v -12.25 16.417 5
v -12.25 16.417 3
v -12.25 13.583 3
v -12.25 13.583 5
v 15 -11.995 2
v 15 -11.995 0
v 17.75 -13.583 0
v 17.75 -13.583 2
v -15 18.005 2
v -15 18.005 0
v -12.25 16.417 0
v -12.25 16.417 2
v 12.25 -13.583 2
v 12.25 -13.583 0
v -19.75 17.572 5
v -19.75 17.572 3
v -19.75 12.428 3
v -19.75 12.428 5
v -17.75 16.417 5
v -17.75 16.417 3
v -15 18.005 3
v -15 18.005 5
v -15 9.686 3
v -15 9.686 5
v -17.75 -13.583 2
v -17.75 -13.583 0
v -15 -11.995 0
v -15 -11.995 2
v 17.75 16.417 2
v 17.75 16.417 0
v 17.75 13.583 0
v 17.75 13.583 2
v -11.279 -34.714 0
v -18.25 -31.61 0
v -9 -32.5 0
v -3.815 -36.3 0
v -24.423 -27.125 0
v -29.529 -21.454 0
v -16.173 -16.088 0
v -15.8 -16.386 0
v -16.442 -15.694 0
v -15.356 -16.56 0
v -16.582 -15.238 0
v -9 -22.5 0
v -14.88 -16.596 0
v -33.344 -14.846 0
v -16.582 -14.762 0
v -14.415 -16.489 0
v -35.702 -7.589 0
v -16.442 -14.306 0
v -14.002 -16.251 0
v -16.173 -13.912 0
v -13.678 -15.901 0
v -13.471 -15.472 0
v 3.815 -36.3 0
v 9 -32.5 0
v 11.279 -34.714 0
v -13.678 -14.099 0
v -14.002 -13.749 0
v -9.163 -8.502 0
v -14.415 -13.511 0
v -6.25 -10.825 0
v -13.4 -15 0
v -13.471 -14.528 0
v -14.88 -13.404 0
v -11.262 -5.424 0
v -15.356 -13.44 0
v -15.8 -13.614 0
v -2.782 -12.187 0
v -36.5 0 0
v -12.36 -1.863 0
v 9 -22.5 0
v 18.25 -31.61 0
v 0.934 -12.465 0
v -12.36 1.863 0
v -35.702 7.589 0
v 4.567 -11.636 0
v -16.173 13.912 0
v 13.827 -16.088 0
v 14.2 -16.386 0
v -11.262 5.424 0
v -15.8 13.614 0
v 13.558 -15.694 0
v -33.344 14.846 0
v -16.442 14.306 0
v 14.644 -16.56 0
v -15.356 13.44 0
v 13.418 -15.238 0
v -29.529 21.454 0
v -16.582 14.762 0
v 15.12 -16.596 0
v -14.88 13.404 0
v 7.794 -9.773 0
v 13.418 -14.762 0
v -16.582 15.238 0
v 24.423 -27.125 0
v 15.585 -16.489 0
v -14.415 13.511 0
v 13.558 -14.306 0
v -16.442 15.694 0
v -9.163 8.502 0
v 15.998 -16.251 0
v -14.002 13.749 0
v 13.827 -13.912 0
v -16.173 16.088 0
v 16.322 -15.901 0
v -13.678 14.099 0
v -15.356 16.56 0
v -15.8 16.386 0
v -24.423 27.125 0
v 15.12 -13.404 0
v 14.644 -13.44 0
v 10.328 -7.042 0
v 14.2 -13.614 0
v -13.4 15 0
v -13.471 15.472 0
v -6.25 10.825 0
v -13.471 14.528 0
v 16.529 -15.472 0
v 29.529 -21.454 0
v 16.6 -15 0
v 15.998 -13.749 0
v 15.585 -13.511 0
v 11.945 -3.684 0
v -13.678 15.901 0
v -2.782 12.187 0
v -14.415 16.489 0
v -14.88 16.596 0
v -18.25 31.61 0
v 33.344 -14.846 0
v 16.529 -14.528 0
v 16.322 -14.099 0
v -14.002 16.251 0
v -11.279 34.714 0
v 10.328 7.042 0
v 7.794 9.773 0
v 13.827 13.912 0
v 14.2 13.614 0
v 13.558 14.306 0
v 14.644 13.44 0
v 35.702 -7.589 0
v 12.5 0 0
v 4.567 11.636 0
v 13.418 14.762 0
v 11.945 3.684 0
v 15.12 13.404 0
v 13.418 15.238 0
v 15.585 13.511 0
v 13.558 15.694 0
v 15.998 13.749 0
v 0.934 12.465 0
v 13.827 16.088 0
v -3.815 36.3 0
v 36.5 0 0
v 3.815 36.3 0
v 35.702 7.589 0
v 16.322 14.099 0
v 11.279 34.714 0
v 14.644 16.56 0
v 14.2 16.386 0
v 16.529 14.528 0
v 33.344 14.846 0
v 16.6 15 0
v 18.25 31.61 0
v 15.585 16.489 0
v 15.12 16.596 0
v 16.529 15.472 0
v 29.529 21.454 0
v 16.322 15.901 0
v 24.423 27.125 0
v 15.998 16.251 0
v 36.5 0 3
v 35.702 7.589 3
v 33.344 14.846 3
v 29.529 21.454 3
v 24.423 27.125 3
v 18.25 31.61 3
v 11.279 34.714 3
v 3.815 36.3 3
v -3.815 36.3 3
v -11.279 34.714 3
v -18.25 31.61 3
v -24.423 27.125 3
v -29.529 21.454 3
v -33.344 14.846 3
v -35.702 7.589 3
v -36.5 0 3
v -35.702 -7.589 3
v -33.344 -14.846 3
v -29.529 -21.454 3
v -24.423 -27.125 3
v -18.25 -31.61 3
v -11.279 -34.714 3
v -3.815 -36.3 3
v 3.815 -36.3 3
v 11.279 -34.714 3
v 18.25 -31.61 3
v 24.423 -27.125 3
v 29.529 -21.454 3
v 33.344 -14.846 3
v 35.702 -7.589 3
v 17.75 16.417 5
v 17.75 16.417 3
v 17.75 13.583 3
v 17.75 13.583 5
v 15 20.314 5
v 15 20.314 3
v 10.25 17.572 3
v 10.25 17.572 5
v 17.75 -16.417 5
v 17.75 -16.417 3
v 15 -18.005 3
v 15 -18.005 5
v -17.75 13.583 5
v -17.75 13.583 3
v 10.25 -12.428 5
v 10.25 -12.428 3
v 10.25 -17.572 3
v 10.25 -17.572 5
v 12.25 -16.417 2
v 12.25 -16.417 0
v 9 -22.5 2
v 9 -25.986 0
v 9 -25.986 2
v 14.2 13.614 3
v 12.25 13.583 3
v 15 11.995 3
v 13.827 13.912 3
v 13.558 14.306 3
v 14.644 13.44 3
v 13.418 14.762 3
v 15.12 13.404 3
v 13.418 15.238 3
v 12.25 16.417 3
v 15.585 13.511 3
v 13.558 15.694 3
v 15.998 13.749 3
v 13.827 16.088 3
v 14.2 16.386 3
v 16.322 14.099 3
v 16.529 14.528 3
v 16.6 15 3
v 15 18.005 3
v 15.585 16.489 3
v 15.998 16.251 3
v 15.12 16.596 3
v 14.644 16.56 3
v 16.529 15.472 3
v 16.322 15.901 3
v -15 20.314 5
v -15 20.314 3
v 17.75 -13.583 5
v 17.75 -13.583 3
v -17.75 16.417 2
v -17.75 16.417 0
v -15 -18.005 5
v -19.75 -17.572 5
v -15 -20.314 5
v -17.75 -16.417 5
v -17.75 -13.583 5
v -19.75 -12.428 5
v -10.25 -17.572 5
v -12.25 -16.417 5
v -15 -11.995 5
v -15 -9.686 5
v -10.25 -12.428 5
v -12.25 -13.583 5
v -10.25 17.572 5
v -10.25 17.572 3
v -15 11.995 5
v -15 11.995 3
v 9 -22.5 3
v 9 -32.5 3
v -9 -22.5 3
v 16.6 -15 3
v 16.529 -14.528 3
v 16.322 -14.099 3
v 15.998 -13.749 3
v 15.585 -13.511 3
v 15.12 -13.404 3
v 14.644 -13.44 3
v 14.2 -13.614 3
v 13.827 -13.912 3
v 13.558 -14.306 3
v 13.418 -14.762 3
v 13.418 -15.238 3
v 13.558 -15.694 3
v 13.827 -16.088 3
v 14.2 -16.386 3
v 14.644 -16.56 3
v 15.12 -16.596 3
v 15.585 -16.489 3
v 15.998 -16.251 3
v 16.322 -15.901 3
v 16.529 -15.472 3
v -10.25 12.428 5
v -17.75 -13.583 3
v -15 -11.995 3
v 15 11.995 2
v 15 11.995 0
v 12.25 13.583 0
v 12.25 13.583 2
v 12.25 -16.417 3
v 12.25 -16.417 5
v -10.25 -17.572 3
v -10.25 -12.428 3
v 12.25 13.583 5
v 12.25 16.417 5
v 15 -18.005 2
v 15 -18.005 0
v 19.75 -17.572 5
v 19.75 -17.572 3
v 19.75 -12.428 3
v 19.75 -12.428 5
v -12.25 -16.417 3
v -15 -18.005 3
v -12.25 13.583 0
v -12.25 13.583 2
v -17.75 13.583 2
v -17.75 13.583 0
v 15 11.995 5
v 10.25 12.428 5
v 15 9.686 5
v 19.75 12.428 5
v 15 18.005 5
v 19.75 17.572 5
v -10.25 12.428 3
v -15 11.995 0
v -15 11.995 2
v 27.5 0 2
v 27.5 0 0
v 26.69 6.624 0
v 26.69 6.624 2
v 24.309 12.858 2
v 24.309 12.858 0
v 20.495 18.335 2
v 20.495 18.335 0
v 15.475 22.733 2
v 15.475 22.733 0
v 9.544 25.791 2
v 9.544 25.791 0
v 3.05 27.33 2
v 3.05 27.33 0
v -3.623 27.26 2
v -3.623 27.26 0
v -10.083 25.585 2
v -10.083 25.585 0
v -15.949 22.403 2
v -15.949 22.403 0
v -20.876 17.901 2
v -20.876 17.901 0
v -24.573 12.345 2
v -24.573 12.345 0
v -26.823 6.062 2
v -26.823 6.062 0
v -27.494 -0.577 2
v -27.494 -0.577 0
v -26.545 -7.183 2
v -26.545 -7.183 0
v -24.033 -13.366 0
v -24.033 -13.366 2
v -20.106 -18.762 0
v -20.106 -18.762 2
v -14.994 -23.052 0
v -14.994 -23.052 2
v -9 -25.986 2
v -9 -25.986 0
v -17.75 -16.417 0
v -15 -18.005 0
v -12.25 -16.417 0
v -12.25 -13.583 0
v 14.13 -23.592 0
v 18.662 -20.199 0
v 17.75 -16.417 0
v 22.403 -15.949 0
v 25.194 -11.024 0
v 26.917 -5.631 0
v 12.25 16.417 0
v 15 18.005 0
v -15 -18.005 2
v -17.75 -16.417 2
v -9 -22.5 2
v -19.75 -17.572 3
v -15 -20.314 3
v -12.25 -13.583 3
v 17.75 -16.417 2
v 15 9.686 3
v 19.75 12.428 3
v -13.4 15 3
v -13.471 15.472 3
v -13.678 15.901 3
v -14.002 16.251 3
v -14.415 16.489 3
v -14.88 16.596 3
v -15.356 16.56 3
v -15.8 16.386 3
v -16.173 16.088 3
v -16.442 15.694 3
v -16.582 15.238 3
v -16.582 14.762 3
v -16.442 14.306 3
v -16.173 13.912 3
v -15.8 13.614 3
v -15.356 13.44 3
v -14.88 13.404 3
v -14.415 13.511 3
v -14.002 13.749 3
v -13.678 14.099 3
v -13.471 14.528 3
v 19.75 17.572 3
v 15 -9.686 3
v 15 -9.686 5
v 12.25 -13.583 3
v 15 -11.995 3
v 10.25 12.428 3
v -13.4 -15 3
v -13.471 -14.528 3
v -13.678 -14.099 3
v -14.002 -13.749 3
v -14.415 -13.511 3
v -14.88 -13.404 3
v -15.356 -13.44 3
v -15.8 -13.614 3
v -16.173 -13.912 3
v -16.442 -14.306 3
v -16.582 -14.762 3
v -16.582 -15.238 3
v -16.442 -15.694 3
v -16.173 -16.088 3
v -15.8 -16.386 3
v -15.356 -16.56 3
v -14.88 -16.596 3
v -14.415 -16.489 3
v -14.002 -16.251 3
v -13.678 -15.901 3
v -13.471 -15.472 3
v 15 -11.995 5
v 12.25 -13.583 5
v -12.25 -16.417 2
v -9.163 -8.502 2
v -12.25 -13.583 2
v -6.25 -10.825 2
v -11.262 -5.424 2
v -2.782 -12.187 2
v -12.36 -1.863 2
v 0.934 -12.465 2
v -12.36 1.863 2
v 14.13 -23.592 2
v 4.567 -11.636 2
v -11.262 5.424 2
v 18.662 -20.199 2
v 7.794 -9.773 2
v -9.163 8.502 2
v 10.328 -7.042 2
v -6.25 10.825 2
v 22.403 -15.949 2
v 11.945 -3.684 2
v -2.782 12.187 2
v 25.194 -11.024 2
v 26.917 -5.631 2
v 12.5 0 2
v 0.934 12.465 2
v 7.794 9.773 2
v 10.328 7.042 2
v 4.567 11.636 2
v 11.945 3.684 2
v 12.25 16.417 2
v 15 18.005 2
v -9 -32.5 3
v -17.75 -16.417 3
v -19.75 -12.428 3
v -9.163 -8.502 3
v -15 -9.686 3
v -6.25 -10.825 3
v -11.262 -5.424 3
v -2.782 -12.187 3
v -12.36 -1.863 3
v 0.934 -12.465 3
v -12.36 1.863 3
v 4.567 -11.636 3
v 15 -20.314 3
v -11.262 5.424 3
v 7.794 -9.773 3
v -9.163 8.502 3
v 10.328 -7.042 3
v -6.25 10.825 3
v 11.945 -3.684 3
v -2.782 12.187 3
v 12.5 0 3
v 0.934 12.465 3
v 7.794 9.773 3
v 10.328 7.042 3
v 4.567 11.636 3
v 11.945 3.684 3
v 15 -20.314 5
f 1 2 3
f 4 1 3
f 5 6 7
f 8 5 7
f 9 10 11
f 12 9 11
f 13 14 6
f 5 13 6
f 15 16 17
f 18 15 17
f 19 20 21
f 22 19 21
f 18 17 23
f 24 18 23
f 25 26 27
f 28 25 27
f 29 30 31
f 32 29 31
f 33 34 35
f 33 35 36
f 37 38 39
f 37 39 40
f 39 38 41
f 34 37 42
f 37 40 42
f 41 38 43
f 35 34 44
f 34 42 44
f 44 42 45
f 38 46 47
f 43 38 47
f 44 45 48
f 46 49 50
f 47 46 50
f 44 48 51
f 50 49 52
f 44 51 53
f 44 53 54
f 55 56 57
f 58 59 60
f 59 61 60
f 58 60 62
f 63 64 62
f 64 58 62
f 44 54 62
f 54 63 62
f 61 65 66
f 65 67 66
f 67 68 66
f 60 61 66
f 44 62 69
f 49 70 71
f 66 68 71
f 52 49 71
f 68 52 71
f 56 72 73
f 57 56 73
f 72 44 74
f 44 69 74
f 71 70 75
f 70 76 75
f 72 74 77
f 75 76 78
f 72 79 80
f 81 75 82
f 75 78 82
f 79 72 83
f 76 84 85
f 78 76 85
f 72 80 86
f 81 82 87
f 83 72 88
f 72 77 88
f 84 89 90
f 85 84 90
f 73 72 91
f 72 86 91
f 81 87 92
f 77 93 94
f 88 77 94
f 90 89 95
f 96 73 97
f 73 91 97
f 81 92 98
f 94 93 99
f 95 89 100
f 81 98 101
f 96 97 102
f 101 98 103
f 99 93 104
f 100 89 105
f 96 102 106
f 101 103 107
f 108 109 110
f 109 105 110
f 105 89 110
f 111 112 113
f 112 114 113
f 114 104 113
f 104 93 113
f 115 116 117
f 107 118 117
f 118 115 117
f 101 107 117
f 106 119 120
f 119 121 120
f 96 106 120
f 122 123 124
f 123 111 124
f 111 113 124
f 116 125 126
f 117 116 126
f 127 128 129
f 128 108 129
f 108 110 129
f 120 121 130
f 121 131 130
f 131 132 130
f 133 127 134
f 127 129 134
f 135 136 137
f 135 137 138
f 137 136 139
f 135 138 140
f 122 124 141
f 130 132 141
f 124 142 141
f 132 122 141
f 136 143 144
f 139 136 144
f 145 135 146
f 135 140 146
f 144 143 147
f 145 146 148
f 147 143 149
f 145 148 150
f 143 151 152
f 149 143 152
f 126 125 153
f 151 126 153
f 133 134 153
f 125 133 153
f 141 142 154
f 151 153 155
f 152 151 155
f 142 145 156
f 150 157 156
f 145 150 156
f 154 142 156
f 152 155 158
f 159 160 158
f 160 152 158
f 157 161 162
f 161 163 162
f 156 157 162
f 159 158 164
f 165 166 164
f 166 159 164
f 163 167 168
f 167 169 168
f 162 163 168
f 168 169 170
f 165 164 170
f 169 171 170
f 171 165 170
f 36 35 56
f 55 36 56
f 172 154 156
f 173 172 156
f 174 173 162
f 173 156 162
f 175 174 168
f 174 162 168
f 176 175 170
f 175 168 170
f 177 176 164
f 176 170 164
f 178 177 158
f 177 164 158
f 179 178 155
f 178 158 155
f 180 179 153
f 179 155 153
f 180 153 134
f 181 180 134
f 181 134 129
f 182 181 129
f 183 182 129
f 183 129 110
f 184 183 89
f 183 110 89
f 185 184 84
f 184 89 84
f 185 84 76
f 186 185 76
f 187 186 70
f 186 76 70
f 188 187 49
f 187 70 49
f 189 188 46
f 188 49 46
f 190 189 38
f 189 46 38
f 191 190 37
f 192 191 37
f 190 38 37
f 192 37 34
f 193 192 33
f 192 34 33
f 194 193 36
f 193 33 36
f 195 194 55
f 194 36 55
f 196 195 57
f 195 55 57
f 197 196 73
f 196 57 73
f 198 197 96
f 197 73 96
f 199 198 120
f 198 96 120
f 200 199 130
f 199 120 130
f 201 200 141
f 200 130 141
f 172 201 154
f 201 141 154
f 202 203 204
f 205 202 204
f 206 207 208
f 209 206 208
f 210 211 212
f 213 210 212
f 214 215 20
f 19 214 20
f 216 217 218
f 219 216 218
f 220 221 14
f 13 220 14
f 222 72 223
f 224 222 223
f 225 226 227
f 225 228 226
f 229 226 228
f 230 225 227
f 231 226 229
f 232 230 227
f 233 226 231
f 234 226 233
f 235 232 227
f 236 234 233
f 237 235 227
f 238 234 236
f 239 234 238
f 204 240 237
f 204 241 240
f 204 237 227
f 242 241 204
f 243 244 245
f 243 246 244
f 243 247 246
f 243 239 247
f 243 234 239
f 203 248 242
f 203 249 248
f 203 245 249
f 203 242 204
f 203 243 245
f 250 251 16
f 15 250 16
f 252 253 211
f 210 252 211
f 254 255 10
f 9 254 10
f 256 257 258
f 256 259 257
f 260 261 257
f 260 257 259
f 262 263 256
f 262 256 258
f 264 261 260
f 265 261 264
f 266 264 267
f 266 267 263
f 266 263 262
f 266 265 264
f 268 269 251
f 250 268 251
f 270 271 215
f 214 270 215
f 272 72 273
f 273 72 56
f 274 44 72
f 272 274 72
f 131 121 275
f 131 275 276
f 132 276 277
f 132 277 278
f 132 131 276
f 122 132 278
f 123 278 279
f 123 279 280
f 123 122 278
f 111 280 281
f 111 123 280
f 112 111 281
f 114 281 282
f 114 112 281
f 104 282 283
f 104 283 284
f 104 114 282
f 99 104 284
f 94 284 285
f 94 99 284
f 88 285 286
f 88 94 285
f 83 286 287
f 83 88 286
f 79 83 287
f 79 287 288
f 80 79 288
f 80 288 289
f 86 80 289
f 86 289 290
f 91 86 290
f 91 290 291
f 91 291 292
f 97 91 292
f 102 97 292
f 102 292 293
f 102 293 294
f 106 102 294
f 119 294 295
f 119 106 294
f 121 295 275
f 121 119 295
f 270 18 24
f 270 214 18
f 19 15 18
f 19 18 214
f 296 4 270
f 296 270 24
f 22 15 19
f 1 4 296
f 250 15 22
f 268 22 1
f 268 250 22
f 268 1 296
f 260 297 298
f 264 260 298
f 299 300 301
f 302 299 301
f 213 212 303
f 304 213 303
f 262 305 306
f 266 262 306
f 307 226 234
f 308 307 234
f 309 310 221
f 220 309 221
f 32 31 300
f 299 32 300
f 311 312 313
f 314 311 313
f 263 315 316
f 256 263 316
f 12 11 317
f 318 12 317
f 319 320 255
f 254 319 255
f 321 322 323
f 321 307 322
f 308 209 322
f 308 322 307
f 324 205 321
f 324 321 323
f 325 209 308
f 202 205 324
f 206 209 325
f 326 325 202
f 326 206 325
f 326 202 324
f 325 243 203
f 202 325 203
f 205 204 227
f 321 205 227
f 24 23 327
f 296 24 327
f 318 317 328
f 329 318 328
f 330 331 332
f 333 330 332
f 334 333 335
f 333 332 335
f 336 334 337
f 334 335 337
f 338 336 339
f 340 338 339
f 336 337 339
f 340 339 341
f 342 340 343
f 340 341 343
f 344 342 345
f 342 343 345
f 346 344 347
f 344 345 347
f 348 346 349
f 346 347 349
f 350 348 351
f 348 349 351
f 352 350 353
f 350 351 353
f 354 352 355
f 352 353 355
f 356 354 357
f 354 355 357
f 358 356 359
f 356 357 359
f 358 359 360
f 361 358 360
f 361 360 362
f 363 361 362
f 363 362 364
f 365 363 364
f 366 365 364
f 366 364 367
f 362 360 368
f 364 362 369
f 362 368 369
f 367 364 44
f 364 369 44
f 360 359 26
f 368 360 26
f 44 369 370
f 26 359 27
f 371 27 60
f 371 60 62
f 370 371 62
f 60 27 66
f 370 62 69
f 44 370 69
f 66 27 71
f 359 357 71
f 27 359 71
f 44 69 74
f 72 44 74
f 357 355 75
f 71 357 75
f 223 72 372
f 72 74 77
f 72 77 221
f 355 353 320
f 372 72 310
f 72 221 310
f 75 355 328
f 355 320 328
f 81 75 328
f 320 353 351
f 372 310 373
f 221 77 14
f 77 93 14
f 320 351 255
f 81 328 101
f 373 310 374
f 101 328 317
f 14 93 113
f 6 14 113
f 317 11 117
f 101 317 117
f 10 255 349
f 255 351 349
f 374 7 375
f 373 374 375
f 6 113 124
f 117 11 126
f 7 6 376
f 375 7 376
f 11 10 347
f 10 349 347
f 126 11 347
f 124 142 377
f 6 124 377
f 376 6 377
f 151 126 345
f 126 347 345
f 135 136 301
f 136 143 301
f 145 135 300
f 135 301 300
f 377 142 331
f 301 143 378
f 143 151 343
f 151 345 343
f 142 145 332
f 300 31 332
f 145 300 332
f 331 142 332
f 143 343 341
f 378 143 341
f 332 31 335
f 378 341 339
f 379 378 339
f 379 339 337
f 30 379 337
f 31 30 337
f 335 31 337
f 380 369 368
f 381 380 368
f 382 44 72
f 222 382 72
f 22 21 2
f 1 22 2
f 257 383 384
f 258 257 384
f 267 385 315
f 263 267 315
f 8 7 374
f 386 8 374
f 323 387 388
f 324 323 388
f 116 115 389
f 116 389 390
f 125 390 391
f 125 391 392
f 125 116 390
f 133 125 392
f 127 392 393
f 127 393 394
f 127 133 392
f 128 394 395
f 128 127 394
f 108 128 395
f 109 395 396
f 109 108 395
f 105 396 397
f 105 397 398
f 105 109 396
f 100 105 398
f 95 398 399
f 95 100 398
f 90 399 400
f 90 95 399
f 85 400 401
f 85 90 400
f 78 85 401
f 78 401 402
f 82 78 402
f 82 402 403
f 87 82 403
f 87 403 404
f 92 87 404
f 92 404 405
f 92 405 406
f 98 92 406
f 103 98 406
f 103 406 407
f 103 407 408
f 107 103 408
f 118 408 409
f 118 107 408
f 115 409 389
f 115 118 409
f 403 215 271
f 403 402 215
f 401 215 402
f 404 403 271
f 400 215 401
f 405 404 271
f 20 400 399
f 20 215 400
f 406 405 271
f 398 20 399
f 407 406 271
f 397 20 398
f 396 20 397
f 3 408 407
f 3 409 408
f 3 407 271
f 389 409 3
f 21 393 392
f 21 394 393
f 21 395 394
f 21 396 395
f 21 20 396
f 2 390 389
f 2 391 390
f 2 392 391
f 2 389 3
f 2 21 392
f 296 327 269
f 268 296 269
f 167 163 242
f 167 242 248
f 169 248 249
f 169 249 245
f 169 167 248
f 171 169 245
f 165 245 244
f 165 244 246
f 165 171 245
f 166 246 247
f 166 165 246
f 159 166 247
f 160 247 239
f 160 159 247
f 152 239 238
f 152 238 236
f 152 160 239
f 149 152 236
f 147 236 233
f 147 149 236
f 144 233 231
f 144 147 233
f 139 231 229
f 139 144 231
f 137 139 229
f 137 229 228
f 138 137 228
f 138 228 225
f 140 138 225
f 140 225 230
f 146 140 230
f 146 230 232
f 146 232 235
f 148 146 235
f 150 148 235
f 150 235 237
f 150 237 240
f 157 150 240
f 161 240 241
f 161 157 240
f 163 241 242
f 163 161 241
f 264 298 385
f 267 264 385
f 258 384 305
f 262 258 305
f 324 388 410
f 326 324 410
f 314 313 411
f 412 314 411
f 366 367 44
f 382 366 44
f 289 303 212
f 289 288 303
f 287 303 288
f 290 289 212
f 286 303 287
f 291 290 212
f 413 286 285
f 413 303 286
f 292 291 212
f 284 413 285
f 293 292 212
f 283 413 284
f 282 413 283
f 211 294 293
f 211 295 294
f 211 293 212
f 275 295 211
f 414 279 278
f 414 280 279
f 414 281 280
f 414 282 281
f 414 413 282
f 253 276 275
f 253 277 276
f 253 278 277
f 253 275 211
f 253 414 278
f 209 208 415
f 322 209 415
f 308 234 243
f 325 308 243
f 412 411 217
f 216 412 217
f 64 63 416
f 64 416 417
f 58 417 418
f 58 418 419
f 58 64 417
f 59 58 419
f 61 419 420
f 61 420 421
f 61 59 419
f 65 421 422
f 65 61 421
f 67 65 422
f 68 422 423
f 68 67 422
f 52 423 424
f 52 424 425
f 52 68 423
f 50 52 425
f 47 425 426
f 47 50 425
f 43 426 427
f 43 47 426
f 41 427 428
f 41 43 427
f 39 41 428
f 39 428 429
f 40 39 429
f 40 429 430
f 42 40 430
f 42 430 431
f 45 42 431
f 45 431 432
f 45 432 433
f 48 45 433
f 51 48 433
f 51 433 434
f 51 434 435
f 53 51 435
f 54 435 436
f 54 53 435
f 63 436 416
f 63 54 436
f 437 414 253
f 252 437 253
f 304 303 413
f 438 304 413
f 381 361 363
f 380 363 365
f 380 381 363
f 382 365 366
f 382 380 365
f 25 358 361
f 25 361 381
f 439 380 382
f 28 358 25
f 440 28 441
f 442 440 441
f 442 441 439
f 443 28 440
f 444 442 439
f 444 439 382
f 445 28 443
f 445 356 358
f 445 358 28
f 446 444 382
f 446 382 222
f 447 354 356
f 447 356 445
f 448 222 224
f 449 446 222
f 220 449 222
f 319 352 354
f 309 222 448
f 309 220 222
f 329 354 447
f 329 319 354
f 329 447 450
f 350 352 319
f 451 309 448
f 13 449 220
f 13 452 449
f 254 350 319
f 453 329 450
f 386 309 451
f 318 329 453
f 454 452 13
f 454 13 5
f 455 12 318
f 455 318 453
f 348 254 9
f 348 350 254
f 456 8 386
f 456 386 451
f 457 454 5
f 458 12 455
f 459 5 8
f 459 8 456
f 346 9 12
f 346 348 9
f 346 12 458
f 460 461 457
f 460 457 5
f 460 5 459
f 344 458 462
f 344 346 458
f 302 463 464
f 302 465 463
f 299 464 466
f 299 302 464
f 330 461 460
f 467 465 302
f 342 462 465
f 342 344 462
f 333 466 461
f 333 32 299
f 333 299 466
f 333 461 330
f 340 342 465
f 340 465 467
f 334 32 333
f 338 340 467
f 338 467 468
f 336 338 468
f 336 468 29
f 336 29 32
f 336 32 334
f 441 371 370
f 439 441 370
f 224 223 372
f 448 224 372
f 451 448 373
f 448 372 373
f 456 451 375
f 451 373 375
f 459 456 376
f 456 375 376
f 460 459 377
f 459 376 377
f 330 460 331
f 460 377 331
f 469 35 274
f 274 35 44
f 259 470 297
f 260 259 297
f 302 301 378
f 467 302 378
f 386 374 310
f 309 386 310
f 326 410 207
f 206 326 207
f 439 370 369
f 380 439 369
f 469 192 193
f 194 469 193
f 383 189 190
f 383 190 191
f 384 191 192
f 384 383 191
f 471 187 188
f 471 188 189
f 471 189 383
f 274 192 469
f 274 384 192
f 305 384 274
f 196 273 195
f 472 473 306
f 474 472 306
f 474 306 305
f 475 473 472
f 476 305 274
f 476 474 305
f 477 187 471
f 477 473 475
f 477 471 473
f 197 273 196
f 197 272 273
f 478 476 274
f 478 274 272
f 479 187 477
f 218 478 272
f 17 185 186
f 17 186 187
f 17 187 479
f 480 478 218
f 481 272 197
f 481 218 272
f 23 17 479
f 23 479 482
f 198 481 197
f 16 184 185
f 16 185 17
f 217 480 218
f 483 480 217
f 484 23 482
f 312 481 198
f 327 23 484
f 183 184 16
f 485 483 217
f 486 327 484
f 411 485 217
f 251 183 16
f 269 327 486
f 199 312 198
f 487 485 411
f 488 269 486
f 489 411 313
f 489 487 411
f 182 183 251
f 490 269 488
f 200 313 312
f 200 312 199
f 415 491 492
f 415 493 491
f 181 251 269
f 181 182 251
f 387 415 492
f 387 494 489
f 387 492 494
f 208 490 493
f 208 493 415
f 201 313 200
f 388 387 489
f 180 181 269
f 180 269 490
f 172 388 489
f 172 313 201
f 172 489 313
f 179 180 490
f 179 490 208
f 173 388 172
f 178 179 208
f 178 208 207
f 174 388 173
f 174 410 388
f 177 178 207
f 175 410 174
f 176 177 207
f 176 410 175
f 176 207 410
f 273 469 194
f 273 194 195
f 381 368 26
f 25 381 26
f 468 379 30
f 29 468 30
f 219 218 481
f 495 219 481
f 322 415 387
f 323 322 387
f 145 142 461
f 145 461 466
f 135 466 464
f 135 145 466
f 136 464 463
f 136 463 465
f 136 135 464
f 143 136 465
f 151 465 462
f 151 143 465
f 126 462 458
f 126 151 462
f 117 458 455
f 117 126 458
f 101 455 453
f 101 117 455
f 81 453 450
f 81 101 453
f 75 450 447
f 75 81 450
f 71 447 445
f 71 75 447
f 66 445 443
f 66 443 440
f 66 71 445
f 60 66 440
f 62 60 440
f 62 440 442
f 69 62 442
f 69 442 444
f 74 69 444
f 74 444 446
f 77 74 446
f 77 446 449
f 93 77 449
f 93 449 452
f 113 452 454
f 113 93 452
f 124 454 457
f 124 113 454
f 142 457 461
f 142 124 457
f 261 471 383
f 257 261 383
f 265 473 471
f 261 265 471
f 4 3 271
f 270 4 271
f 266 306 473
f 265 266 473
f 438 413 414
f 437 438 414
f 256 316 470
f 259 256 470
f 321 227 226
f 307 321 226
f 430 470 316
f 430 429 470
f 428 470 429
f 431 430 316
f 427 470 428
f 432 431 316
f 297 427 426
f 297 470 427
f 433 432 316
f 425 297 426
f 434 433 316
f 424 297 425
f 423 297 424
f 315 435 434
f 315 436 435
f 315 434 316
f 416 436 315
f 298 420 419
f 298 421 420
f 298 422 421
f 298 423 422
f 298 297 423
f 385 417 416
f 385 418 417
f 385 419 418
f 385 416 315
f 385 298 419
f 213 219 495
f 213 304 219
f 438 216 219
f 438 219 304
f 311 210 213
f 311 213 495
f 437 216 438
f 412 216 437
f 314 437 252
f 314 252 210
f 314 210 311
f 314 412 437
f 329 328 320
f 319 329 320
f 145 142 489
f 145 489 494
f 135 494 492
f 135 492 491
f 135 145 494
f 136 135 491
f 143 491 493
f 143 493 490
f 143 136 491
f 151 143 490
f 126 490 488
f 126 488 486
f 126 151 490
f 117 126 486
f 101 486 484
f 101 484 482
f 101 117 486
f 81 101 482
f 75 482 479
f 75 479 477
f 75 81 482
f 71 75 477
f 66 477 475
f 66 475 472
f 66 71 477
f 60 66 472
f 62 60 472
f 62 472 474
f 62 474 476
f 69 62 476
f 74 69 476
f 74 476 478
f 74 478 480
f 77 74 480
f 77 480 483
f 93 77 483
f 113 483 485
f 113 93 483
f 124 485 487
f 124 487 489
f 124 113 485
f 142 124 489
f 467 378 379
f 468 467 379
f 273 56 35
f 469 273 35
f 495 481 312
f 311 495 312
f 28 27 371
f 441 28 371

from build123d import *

# Parameters (mm, degrees)
F0_R     = 36.5
F0_R_2   = 12.5
F0_R_3   = 1.6
F1_DEPTH = 3
F2_DEPTH = 5
F3_DEPTH = 2


# Not quite as in the source:
# - a feature names something its author has since deleted; it is built from what else it names


with BuildPart() as f1:
    # F0 (on Top) → F1 (new body)
    with BuildSketch(Plane.XY):
        Circle(F0_R)
        with BuildLine():
            Line((9, -25.9855729204), (9, -32.5))
            Line((9, -32.5), (-9, -32.5))
            Line((-9, -32.5), (-9, -25.9855729204))
            ThreePointArc((-9, -25.9855729204), (-15.9491379077, 22.4025668172), (27.5, 0))
            ThreePointArc((27.5, 0), (22.4025668172, -15.9491379077), (9, -25.9855729204))
        make_face(mode=Mode.SUBTRACT)
        with BuildLine():
            Line((9, -22.5), (9, -25.9855729204))
            ThreePointArc((9, -25.9855729204), (22.4025668172, -15.9491379077), (27.5, 0))
            ThreePointArc((27.5, 0), (-15.9491379077, 22.4025668172), (-9, -25.9855729204))
            Line((-9, -25.9855729204), (-9, -22.5))
            Line((-9, -22.5), (9, -22.5))
        make_face()
        Polygon((-10.25, -12.4280127019), (-10.25, -17.5719872981), (-15, -20.3144010768), (-19.75, -17.5719872981), (-19.75, -12.4280127019), (-15, -9.6855989232), align=None, mode=Mode.SUBTRACT)
        Polygon((15, -20.3144010768), (10.25, -17.5719872981), (10.25, -12.4280127019), (15, -9.6855989232), (19.75, -12.4280127019), (19.75, -17.5719872981), align=None, mode=Mode.SUBTRACT)
        Polygon((-15, 9.6855989232), (-19.75, 12.4280127019), (-19.75, 17.5719872981), (-15, 20.3144010768), (-10.25, 17.5719872981), (-10.25, 12.4280127019), align=None, mode=Mode.SUBTRACT)
        Circle(F0_R_2, mode=Mode.SUBTRACT)
        Polygon((10.25, 12.4280127019), (10.25, 17.5719872981), (15, 20.3144010768), (19.75, 17.5719872981), (19.75, 12.4280127019), (15, 9.6855989232), align=None, mode=Mode.SUBTRACT)
        Polygon((-19.75, 17.5719872981), (-19.75, 12.4280127019), (-15, 9.6855989232), (-10.25, 12.4280127019), (-10.25, 17.5719872981), (-15, 20.3144010768), align=None)
        Polygon((-17.75, 13.5827132403), (-17.75, 16.4172867597), (-15, 18.005), (-12.25, 16.4172867597), (-12.25, 13.5827132403), (-15, 11.995), align=None, mode=Mode.SUBTRACT)
        Polygon((-15, -20.3144010768), (-10.25, -17.5719872981), (-10.25, -12.4280127019), (-15, -9.6855989232), (-19.75, -12.4280127019), (-19.75, -17.5719872981), align=None)
        Polygon((-17.75, -16.4172867597), (-17.75, -13.5827132403), (-15, -11.995), (-12.25, -13.5827132403), (-12.25, -16.4172867597), (-15, -18.005), align=None, mode=Mode.SUBTRACT)
        Polygon((15, 20.3144010768), (10.25, 17.5719872981), (10.25, 12.4280127019), (15, 9.6855989232), (19.75, 12.4280127019), (19.75, 17.5719872981), align=None)
        Polygon((12.25, 13.5827132403), (12.25, 16.4172867597), (15, 18.005), (17.75, 16.4172867597), (17.75, 13.5827132403), (15, 11.995), align=None, mode=Mode.SUBTRACT)
        Polygon((10.25, -12.4280127019), (10.25, -17.5719872981), (15, -20.3144010768), (19.75, -17.5719872981), (19.75, -12.4280127019), (15, -9.6855989232), align=None)
        Polygon((15, -11.995), (17.75, -13.5827132403), (17.75, -16.4172867597), (15, -18.005), (12.25, -16.4172867597), (12.25, -13.5827132403), align=None, mode=Mode.SUBTRACT)
        Polygon((-15, 18.005), (-17.75, 16.4172867597), (-17.75, 13.5827132403), (-15, 11.995), (-12.25, 13.5827132403), (-12.25, 16.4172867597), align=None)
        with Locations((-15, 15)):
            Circle(F0_R_3, mode=Mode.SUBTRACT)
        Polygon((-15, -11.995), (-17.75, -13.5827132403), (-17.75, -16.4172867597), (-15, -18.005), (-12.25, -16.4172867597), (-12.25, -13.5827132403), align=None)
        with Locations((-15, -15)):
            Circle(F0_R_3, mode=Mode.SUBTRACT)
        Polygon((15, 18.005), (12.25, 16.4172867597), (12.25, 13.5827132403), (15, 11.995), (17.75, 13.5827132403), (17.75, 16.4172867597), align=None)
        with Locations((15, 15)):
            Circle(F0_R_3, mode=Mode.SUBTRACT)
        Polygon((17.75, -16.4172867597), (17.75, -13.5827132403), (15, -11.995), (12.25, -13.5827132403), (12.25, -16.4172867597), (15, -18.005), align=None)
        with Locations((15, -15)):
            Circle(F0_R_3, mode=Mode.SUBTRACT)
    extrude(amount=F1_DEPTH)

    # F0 (on Top) → F2 (join)
    with BuildSketch(Plane.XY):
        Polygon((-19.75, 17.5719872981), (-19.75, 12.4280127019), (-15, 9.6855989232), (-10.25, 12.4280127019), (-10.25, 17.5719872981), (-15, 20.3144010768), align=None)
        Polygon((-17.75, 13.5827132403), (-17.75, 16.4172867597), (-15, 18.005), (-12.25, 16.4172867597), (-12.25, 13.5827132403), (-15, 11.995), align=None, mode=Mode.SUBTRACT)
        Polygon((-15, -20.3144010768), (-10.25, -17.5719872981), (-10.25, -12.4280127019), (-15, -9.6855989232), (-19.75, -12.4280127019), (-19.75, -17.5719872981), align=None)
        Polygon((-17.75, -16.4172867597), (-17.75, -13.5827132403), (-15, -11.995), (-12.25, -13.5827132403), (-12.25, -16.4172867597), (-15, -18.005), align=None, mode=Mode.SUBTRACT)
        Polygon((15, 20.3144010768), (10.25, 17.5719872981), (10.25, 12.4280127019), (15, 9.6855989232), (19.75, 12.4280127019), (19.75, 17.5719872981), align=None)
        Polygon((12.25, 13.5827132403), (12.25, 16.4172867597), (15, 18.005), (17.75, 16.4172867597), (17.75, 13.5827132403), (15, 11.995), align=None, mode=Mode.SUBTRACT)
        Polygon((10.25, -12.4280127019), (10.25, -17.5719872981), (15, -20.3144010768), (19.75, -17.5719872981), (19.75, -12.4280127019), (15, -9.6855989232), align=None)
        Polygon((15, -11.995), (17.75, -13.5827132403), (17.75, -16.4172867597), (15, -18.005), (12.25, -16.4172867597), (12.25, -13.5827132403), align=None, mode=Mode.SUBTRACT)
    extrude(amount=F2_DEPTH)


with BuildPart() as f3:
    # F0 (on Top) → F3 (new body)
    with BuildSketch(Plane.XY):
        with BuildLine():
            Line((9, -22.5), (9, -25.9855729204))
            ThreePointArc((9, -25.9855729204), (22.4025668172, -15.9491379077), (27.5, 0))
            ThreePointArc((27.5, 0), (-15.9491379077, 22.4025668172), (-9, -25.9855729204))
            Line((-9, -25.9855729204), (-9, -22.5))
            Line((-9, -22.5), (9, -22.5))
        make_face()
        Polygon((-10.25, -12.4280127019), (-10.25, -17.5719872981), (-15, -20.3144010768), (-19.75, -17.5719872981), (-19.75, -12.4280127019), (-15, -9.6855989232), align=None, mode=Mode.SUBTRACT)
        Polygon((15, -20.3144010768), (10.25, -17.5719872981), (10.25, -12.4280127019), (15, -9.6855989232), (19.75, -12.4280127019), (19.75, -17.5719872981), align=None, mode=Mode.SUBTRACT)
        Polygon((-15, 9.6855989232), (-19.75, 12.4280127019), (-19.75, 17.5719872981), (-15, 20.3144010768), (-10.25, 17.5719872981), (-10.25, 12.4280127019), align=None, mode=Mode.SUBTRACT)
        Circle(F0_R_2, mode=Mode.SUBTRACT)
        Polygon((10.25, 12.4280127019), (10.25, 17.5719872981), (15, 20.3144010768), (19.75, 17.5719872981), (19.75, 12.4280127019), (15, 9.6855989232), align=None, mode=Mode.SUBTRACT)
        Polygon((-19.75, 17.5719872981), (-19.75, 12.4280127019), (-15, 9.6855989232), (-10.25, 12.4280127019), (-10.25, 17.5719872981), (-15, 20.3144010768), align=None)
        Polygon((-17.75, 13.5827132403), (-17.75, 16.4172867597), (-15, 18.005), (-12.25, 16.4172867597), (-12.25, 13.5827132403), (-15, 11.995), align=None, mode=Mode.SUBTRACT)
        Polygon((15, 20.3144010768), (10.25, 17.5719872981), (10.25, 12.4280127019), (15, 9.6855989232), (19.75, 12.4280127019), (19.75, 17.5719872981), align=None)
        Polygon((12.25, 13.5827132403), (12.25, 16.4172867597), (15, 18.005), (17.75, 16.4172867597), (17.75, 13.5827132403), (15, 11.995), align=None, mode=Mode.SUBTRACT)
        Polygon((-15, -20.3144010768), (-10.25, -17.5719872981), (-10.25, -12.4280127019), (-15, -9.6855989232), (-19.75, -12.4280127019), (-19.75, -17.5719872981), align=None)
        Polygon((-17.75, -16.4172867597), (-17.75, -13.5827132403), (-15, -11.995), (-12.25, -13.5827132403), (-12.25, -16.4172867597), (-15, -18.005), align=None, mode=Mode.SUBTRACT)
        Polygon((10.25, -12.4280127019), (10.25, -17.5719872981), (15, -20.3144010768), (19.75, -17.5719872981), (19.75, -12.4280127019), (15, -9.6855989232), align=None)
        Polygon((15, -11.995), (17.75, -13.5827132403), (17.75, -16.4172867597), (15, -18.005), (12.25, -16.4172867597), (12.25, -13.5827132403), align=None, mode=Mode.SUBTRACT)
    extrude(amount=F3_DEPTH)


solid = Compound([f1.part, f3.part])
